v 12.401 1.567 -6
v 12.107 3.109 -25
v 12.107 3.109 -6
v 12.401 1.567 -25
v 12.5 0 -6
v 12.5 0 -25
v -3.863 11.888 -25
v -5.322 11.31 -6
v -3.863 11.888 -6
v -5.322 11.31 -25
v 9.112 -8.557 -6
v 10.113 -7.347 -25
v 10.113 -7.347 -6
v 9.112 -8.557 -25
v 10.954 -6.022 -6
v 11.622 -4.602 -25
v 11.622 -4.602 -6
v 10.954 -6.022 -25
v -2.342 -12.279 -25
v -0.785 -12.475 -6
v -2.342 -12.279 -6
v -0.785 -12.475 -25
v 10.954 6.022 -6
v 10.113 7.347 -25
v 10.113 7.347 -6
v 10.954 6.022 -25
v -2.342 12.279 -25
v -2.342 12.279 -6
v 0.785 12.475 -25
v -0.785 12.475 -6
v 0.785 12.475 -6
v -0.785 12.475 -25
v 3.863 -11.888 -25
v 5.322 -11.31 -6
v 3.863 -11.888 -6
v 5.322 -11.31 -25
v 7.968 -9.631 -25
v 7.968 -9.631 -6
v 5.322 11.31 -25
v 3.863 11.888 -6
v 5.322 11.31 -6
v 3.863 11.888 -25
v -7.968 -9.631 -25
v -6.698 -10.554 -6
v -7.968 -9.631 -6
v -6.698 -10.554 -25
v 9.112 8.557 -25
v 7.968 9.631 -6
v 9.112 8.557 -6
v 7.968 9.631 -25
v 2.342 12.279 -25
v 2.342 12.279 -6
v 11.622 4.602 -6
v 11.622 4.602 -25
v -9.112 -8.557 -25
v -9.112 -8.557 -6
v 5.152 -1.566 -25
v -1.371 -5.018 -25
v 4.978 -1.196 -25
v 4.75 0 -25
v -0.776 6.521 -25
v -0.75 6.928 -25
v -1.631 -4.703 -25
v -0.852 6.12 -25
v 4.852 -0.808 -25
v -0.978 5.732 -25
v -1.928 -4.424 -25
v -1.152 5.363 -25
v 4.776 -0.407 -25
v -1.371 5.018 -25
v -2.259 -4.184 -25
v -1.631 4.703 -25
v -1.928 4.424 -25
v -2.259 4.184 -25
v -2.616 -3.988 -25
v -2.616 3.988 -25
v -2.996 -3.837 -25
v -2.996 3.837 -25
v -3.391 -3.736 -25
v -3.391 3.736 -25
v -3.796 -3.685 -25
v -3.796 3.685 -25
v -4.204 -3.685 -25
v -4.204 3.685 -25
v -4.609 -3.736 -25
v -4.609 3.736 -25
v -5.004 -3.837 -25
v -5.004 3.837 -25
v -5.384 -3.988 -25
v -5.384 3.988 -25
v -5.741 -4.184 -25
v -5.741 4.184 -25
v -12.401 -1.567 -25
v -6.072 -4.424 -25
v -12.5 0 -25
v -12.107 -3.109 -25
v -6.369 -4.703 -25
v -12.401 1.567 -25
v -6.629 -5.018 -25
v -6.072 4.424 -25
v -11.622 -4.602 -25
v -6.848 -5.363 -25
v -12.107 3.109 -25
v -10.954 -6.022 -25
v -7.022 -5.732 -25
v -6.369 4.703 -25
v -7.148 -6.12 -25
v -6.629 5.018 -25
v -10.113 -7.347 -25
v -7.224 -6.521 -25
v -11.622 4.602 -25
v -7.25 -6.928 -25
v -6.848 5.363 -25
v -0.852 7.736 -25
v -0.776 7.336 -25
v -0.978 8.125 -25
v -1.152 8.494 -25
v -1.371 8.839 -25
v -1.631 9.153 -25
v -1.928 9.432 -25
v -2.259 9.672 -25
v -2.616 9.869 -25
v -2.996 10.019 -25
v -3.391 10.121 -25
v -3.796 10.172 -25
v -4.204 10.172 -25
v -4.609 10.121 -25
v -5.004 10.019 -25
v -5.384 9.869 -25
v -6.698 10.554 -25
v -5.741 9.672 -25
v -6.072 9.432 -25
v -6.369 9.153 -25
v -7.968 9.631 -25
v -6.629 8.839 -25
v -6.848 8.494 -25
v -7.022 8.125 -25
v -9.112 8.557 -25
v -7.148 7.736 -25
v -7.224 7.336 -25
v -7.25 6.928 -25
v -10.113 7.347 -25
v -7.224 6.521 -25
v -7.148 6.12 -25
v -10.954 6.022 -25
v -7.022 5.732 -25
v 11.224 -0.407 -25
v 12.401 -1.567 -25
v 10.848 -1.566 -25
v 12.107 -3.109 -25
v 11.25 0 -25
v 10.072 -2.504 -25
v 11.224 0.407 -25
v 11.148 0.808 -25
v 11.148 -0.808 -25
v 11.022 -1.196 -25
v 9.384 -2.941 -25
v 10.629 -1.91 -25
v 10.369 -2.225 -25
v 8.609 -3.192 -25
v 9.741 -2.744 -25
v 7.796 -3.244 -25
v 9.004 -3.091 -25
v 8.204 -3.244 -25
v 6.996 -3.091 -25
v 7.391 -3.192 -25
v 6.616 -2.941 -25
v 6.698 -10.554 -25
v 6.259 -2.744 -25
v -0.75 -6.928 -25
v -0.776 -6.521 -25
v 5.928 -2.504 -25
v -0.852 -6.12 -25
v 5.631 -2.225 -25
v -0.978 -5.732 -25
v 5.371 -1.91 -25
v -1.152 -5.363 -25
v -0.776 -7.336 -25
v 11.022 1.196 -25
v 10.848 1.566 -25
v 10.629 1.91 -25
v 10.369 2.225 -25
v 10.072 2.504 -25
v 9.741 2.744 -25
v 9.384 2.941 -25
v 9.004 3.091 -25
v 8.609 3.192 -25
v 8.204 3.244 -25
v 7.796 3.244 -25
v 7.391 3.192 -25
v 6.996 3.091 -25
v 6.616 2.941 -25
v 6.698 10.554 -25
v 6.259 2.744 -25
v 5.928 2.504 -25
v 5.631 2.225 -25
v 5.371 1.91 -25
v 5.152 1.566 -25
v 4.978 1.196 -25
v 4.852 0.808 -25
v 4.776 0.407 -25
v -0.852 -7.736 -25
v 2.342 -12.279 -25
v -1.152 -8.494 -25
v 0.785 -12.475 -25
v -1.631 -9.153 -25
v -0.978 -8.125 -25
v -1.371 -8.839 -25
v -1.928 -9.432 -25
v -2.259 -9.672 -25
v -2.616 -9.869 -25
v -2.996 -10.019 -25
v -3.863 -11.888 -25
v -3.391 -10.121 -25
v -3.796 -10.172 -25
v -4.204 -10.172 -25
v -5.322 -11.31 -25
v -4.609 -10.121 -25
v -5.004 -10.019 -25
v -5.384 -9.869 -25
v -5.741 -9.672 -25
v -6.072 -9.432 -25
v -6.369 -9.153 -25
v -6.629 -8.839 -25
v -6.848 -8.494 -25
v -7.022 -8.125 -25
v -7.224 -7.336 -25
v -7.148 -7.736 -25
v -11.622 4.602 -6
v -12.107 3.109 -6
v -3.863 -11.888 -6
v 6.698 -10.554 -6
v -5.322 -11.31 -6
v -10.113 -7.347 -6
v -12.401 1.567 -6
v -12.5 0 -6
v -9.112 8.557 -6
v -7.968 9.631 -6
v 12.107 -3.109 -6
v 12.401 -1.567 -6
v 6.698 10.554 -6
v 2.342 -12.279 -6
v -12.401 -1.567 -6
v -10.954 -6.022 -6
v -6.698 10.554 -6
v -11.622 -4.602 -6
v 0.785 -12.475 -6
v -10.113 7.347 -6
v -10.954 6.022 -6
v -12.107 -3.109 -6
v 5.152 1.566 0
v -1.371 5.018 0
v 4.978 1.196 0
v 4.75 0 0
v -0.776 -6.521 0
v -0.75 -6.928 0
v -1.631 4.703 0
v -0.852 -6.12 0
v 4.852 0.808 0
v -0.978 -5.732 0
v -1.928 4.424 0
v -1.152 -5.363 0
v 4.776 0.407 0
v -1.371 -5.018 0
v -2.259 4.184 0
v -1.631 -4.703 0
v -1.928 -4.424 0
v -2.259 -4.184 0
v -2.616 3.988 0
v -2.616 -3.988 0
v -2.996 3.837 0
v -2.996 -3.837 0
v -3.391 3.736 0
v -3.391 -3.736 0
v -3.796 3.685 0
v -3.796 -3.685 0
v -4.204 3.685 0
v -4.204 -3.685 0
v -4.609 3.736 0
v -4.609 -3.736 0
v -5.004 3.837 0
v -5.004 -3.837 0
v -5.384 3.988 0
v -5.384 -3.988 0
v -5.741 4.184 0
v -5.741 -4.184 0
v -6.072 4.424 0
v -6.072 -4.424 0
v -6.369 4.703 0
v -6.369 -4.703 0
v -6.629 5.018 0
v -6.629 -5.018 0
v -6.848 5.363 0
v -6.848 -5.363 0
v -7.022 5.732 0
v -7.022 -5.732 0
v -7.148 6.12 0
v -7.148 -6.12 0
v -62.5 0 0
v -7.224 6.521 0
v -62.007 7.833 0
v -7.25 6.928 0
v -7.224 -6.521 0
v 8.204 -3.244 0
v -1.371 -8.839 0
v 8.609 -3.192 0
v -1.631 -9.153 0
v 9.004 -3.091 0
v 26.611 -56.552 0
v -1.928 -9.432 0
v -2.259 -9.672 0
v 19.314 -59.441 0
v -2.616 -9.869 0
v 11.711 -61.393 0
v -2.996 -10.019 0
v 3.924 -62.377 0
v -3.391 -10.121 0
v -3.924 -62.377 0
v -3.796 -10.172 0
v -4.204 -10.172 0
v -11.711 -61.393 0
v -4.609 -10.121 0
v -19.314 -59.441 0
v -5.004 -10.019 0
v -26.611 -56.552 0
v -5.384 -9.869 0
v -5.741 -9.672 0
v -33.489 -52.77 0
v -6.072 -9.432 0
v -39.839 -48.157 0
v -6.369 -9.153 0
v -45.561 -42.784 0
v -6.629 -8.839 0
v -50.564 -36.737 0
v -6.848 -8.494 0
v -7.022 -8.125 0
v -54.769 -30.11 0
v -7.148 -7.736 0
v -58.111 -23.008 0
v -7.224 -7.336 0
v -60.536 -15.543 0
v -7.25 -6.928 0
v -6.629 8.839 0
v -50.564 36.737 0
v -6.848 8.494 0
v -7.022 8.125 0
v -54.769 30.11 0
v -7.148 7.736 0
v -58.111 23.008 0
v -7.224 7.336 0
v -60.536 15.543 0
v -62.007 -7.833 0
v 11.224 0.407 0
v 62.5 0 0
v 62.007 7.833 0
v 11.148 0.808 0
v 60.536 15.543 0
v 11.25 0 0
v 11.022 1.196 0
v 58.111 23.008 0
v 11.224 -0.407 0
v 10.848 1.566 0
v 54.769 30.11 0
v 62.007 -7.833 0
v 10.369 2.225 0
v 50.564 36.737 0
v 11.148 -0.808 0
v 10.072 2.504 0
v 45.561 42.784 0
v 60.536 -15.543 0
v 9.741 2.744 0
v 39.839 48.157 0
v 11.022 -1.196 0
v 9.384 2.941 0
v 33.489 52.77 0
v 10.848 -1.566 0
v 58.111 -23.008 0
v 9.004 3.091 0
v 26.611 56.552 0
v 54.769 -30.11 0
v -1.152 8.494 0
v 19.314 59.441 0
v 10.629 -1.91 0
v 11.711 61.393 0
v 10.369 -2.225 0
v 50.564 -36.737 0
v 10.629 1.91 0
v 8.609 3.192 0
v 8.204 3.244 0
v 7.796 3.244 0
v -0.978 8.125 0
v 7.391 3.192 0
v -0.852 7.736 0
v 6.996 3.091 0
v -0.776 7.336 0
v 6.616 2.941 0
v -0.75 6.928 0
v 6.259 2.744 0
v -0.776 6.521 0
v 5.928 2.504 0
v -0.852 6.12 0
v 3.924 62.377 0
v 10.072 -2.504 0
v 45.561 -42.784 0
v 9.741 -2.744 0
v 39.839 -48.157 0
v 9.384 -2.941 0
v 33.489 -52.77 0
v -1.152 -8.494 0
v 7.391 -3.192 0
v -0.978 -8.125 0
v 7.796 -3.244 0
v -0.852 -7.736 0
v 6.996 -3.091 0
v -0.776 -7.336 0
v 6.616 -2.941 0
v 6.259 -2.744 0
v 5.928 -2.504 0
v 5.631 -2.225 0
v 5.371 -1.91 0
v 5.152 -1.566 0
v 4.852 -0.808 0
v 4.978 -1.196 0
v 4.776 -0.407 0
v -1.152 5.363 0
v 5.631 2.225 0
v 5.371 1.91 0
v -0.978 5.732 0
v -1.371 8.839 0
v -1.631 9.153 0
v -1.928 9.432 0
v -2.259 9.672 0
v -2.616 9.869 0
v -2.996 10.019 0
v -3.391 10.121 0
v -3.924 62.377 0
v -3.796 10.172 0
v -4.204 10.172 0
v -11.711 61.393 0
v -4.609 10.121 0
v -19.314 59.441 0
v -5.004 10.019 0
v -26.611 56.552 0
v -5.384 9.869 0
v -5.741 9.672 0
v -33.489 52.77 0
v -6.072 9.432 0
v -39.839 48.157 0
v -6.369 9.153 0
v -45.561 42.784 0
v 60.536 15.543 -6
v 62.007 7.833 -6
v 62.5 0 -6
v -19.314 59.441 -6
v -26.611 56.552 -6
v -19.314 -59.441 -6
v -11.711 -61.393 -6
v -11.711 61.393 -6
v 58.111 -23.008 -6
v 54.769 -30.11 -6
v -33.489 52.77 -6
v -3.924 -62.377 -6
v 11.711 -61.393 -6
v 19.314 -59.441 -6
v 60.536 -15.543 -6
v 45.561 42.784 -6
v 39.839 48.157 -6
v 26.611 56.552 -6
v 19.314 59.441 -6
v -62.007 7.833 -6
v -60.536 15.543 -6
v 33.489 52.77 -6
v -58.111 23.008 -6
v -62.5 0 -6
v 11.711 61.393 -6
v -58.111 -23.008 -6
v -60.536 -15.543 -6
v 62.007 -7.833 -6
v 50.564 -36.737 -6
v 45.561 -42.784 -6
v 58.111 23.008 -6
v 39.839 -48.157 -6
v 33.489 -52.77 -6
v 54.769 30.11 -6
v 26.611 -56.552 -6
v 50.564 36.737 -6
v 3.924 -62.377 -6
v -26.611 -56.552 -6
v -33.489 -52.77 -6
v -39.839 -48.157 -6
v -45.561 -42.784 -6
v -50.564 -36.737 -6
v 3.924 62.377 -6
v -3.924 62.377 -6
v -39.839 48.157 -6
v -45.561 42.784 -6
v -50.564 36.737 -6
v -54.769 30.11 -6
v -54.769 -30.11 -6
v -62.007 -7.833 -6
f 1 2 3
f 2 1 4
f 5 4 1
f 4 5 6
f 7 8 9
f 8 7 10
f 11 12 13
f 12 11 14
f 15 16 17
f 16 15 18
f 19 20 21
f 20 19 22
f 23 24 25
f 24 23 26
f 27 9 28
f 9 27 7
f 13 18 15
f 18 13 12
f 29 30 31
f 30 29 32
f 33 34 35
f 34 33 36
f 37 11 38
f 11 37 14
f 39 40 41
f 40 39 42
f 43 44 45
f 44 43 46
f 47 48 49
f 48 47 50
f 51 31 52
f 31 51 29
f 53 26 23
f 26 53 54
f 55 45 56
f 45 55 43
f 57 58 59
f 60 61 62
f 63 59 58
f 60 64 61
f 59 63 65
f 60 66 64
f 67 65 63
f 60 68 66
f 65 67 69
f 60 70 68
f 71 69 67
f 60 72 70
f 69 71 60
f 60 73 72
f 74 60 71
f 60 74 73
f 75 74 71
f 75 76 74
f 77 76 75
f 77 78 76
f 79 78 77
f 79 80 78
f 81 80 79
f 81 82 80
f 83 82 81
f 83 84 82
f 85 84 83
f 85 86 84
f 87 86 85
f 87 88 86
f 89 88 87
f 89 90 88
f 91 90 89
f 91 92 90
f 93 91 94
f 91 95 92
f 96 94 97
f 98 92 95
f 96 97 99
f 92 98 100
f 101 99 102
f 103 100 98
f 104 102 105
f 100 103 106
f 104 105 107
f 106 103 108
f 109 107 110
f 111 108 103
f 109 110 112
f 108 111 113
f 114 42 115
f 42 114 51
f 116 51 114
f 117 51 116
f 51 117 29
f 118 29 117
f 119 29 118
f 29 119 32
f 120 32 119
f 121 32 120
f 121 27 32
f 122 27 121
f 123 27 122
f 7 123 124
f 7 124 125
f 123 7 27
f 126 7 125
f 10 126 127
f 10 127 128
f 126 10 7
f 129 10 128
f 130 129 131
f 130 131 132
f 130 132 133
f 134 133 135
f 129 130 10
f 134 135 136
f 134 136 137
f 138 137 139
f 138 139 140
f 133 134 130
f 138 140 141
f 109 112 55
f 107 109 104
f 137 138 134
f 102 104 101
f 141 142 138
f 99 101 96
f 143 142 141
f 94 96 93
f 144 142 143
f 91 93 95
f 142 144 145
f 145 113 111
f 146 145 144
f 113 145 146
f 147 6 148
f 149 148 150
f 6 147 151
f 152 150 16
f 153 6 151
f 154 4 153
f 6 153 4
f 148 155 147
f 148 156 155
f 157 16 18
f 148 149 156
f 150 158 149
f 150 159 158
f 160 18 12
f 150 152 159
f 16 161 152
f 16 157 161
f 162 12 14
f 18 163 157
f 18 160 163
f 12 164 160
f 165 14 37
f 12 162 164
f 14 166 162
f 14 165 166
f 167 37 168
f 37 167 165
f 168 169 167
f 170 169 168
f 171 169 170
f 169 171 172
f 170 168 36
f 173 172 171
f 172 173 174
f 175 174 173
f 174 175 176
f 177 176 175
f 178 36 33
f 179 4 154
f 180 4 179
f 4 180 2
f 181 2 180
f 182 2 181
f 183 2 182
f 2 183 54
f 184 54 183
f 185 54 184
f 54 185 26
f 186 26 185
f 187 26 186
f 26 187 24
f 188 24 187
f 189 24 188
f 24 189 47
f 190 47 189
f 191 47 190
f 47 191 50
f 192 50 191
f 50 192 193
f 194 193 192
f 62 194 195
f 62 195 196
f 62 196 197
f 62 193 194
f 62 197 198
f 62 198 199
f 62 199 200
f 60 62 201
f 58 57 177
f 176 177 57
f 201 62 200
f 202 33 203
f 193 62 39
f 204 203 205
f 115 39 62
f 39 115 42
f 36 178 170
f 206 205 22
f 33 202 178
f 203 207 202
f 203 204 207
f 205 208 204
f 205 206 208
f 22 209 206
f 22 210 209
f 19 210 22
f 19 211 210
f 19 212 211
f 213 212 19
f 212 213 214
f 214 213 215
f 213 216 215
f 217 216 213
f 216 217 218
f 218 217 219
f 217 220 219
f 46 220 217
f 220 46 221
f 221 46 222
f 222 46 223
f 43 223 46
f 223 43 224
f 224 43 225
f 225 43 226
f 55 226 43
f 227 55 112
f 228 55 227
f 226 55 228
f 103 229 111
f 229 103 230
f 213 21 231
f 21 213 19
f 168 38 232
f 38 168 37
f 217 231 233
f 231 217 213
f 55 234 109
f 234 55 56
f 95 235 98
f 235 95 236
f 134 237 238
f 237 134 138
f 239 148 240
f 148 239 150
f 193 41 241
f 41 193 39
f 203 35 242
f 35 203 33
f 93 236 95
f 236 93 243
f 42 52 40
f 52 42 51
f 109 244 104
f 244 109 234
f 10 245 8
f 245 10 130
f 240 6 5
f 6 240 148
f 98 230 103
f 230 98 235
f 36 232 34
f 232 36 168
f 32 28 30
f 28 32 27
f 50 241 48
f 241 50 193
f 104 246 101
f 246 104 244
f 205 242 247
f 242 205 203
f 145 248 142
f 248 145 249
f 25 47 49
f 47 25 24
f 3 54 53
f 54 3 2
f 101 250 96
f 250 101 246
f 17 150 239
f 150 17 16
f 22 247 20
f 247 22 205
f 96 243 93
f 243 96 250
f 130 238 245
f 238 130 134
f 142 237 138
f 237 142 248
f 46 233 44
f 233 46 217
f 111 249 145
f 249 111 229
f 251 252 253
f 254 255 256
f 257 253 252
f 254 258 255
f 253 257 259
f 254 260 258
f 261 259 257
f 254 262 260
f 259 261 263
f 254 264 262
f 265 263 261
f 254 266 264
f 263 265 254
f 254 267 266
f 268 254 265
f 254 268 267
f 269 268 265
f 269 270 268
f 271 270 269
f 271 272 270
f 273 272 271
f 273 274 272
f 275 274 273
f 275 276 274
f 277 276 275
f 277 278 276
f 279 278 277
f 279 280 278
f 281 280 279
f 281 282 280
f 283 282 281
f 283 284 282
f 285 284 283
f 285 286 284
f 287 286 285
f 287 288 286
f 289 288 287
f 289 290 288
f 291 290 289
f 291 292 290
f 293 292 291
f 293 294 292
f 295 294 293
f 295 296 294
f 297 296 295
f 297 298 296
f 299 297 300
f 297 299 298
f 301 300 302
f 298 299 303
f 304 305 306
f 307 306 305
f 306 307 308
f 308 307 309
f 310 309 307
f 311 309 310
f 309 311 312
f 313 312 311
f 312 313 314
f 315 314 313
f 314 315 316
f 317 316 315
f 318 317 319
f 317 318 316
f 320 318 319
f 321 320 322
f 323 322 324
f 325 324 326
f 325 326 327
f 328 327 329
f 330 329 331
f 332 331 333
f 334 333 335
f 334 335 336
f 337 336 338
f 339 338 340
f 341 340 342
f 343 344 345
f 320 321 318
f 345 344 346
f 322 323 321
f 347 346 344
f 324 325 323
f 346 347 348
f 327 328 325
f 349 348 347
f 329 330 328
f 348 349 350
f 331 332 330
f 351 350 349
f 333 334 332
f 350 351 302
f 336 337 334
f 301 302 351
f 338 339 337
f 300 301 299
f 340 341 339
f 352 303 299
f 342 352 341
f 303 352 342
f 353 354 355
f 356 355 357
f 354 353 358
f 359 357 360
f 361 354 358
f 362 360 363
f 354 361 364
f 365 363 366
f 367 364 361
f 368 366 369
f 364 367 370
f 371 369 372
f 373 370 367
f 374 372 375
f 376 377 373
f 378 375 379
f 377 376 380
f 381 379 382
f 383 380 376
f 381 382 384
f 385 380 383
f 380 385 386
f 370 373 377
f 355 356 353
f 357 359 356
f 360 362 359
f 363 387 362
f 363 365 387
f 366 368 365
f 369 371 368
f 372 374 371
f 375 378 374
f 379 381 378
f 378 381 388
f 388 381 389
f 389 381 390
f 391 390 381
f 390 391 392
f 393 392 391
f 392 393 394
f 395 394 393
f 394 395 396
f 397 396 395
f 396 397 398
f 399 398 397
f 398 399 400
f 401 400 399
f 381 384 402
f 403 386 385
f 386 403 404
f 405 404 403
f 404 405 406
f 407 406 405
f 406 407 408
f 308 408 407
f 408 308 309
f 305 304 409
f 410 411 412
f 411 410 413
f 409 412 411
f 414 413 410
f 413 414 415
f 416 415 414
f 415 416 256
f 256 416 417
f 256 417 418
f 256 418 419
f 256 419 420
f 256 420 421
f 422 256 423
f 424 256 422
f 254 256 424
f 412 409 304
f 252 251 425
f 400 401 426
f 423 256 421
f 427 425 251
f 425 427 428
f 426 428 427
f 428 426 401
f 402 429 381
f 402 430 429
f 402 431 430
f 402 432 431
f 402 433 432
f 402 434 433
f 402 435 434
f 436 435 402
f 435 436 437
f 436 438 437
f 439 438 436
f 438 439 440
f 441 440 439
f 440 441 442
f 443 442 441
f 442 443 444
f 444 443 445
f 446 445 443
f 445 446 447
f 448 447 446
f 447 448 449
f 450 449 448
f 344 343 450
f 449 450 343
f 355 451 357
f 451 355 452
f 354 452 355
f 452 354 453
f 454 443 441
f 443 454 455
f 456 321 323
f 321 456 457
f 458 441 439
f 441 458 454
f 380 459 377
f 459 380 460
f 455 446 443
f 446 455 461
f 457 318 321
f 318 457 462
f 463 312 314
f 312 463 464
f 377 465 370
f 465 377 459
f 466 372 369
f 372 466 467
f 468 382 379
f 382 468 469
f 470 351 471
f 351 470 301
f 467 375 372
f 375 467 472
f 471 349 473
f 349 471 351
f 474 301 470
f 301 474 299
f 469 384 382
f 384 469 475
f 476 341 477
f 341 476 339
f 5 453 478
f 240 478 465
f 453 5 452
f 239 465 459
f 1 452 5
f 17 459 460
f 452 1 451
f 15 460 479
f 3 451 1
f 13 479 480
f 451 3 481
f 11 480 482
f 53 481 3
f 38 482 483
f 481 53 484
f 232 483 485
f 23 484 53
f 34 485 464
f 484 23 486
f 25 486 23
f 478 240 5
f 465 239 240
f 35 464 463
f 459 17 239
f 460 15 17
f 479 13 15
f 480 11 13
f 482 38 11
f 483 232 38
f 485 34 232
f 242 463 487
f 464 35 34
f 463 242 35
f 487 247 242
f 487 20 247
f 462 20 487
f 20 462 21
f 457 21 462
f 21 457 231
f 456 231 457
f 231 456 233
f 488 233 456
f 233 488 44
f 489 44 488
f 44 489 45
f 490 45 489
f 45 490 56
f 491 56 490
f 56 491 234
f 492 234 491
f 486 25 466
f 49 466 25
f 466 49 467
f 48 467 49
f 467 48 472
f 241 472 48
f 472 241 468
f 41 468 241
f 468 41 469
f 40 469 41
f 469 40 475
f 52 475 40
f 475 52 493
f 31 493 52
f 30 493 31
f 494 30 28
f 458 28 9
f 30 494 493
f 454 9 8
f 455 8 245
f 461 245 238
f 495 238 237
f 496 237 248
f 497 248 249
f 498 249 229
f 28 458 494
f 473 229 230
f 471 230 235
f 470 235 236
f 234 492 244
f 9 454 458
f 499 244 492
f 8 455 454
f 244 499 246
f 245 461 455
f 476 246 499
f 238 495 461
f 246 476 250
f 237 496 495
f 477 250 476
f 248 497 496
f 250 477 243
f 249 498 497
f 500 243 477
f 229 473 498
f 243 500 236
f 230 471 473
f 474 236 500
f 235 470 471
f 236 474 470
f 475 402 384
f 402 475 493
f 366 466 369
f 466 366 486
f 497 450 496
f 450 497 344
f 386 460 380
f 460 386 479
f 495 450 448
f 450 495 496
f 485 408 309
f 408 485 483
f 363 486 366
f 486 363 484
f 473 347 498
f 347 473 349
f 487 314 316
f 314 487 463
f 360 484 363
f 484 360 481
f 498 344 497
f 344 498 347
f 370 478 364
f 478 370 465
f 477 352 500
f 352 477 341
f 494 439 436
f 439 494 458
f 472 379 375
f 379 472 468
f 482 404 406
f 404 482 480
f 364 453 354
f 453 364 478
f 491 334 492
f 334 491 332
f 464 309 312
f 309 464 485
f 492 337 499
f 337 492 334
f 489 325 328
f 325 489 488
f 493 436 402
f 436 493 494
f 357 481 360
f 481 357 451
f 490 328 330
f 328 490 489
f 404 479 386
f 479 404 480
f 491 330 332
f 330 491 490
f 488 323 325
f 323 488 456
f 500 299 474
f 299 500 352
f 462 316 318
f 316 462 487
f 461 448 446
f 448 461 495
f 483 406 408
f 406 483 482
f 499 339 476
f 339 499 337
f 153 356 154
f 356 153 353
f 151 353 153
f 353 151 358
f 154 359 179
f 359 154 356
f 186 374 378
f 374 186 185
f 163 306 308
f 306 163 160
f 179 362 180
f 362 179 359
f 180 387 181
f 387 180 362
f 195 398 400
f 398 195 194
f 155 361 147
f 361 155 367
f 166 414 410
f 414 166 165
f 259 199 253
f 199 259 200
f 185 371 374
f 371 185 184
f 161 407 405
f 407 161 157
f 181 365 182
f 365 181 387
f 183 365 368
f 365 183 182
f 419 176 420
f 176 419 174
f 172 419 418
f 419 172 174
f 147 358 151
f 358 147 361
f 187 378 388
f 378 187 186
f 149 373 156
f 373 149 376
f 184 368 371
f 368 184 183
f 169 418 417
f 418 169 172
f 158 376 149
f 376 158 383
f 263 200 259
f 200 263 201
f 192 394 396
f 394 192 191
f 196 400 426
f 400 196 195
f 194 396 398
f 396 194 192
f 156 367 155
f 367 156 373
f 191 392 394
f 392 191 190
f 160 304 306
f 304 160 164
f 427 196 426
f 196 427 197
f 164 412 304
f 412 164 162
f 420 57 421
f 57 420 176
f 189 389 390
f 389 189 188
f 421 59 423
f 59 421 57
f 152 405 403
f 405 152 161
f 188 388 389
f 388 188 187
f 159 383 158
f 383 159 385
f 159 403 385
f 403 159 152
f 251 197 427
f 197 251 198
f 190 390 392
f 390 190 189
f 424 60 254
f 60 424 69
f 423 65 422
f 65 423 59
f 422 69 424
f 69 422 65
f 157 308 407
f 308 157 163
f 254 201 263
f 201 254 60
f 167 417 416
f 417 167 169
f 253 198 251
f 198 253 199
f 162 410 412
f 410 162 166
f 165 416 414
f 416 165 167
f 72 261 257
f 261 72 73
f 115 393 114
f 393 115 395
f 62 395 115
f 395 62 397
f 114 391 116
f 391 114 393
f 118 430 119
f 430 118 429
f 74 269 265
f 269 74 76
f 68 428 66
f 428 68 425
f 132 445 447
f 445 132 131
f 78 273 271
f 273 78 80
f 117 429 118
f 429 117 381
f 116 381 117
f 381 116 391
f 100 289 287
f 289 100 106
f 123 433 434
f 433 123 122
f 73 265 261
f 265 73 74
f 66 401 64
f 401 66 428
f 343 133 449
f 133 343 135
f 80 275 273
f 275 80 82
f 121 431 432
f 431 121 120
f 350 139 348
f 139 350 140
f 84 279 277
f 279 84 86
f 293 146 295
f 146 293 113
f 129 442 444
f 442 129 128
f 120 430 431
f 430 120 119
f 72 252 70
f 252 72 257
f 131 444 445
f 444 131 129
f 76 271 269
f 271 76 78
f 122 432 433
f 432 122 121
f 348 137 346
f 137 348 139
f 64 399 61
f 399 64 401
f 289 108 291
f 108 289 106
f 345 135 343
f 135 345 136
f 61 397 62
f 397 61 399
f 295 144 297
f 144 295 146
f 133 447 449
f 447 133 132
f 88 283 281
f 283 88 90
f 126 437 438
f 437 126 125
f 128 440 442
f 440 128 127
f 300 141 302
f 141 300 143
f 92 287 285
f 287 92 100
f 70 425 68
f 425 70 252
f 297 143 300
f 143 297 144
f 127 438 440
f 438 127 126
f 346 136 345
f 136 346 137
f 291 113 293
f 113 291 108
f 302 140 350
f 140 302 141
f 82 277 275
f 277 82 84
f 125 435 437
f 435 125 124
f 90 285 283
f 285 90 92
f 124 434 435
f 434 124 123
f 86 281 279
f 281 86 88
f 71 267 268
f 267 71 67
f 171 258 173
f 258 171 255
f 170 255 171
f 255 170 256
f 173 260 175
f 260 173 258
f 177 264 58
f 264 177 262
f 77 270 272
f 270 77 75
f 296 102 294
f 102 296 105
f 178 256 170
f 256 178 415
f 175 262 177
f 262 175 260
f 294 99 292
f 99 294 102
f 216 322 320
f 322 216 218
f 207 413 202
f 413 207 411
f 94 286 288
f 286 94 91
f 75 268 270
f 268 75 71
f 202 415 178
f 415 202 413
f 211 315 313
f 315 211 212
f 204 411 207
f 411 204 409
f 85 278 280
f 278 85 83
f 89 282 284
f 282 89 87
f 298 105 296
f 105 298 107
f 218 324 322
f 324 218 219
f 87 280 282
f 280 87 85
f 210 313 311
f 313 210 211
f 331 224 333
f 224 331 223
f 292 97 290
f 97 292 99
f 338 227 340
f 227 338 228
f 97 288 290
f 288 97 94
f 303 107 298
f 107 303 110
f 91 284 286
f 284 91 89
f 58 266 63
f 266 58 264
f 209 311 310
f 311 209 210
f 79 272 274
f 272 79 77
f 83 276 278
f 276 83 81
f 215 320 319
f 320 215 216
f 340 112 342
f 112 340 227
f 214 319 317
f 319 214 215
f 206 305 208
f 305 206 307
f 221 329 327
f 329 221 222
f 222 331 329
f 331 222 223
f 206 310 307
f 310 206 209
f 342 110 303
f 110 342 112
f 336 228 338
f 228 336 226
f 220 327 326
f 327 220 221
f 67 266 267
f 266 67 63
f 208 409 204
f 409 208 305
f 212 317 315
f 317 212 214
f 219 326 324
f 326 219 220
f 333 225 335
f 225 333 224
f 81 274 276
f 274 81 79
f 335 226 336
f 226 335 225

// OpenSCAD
$fn = 50;


difference() {
	union() {
		translate(v = [0, 0, -25.0000000000]) {
			cylinder(h = 25, r = 12.5000000000);
		}
		translate(v = [0, 0, -6.0000000000]) {
			cylinder(h = 6, r = 62.5000000000);
		}
	}
	union() {
		#translate(v = [8.0000000000, 0.0000000000, -25]) {
			cylinder(h = 25, r = 3.2500000000);
		}
		#translate(v = [-4.0000000000, 6.9282032303, -25]) {
			cylinder(h = 25, r = 3.2500000000);
		}
		#translate(v = [-4.0000000000, -6.9282032303, -25]) {
			cylinder(h = 25, r = 3.2500000000);
		}
	}
}
